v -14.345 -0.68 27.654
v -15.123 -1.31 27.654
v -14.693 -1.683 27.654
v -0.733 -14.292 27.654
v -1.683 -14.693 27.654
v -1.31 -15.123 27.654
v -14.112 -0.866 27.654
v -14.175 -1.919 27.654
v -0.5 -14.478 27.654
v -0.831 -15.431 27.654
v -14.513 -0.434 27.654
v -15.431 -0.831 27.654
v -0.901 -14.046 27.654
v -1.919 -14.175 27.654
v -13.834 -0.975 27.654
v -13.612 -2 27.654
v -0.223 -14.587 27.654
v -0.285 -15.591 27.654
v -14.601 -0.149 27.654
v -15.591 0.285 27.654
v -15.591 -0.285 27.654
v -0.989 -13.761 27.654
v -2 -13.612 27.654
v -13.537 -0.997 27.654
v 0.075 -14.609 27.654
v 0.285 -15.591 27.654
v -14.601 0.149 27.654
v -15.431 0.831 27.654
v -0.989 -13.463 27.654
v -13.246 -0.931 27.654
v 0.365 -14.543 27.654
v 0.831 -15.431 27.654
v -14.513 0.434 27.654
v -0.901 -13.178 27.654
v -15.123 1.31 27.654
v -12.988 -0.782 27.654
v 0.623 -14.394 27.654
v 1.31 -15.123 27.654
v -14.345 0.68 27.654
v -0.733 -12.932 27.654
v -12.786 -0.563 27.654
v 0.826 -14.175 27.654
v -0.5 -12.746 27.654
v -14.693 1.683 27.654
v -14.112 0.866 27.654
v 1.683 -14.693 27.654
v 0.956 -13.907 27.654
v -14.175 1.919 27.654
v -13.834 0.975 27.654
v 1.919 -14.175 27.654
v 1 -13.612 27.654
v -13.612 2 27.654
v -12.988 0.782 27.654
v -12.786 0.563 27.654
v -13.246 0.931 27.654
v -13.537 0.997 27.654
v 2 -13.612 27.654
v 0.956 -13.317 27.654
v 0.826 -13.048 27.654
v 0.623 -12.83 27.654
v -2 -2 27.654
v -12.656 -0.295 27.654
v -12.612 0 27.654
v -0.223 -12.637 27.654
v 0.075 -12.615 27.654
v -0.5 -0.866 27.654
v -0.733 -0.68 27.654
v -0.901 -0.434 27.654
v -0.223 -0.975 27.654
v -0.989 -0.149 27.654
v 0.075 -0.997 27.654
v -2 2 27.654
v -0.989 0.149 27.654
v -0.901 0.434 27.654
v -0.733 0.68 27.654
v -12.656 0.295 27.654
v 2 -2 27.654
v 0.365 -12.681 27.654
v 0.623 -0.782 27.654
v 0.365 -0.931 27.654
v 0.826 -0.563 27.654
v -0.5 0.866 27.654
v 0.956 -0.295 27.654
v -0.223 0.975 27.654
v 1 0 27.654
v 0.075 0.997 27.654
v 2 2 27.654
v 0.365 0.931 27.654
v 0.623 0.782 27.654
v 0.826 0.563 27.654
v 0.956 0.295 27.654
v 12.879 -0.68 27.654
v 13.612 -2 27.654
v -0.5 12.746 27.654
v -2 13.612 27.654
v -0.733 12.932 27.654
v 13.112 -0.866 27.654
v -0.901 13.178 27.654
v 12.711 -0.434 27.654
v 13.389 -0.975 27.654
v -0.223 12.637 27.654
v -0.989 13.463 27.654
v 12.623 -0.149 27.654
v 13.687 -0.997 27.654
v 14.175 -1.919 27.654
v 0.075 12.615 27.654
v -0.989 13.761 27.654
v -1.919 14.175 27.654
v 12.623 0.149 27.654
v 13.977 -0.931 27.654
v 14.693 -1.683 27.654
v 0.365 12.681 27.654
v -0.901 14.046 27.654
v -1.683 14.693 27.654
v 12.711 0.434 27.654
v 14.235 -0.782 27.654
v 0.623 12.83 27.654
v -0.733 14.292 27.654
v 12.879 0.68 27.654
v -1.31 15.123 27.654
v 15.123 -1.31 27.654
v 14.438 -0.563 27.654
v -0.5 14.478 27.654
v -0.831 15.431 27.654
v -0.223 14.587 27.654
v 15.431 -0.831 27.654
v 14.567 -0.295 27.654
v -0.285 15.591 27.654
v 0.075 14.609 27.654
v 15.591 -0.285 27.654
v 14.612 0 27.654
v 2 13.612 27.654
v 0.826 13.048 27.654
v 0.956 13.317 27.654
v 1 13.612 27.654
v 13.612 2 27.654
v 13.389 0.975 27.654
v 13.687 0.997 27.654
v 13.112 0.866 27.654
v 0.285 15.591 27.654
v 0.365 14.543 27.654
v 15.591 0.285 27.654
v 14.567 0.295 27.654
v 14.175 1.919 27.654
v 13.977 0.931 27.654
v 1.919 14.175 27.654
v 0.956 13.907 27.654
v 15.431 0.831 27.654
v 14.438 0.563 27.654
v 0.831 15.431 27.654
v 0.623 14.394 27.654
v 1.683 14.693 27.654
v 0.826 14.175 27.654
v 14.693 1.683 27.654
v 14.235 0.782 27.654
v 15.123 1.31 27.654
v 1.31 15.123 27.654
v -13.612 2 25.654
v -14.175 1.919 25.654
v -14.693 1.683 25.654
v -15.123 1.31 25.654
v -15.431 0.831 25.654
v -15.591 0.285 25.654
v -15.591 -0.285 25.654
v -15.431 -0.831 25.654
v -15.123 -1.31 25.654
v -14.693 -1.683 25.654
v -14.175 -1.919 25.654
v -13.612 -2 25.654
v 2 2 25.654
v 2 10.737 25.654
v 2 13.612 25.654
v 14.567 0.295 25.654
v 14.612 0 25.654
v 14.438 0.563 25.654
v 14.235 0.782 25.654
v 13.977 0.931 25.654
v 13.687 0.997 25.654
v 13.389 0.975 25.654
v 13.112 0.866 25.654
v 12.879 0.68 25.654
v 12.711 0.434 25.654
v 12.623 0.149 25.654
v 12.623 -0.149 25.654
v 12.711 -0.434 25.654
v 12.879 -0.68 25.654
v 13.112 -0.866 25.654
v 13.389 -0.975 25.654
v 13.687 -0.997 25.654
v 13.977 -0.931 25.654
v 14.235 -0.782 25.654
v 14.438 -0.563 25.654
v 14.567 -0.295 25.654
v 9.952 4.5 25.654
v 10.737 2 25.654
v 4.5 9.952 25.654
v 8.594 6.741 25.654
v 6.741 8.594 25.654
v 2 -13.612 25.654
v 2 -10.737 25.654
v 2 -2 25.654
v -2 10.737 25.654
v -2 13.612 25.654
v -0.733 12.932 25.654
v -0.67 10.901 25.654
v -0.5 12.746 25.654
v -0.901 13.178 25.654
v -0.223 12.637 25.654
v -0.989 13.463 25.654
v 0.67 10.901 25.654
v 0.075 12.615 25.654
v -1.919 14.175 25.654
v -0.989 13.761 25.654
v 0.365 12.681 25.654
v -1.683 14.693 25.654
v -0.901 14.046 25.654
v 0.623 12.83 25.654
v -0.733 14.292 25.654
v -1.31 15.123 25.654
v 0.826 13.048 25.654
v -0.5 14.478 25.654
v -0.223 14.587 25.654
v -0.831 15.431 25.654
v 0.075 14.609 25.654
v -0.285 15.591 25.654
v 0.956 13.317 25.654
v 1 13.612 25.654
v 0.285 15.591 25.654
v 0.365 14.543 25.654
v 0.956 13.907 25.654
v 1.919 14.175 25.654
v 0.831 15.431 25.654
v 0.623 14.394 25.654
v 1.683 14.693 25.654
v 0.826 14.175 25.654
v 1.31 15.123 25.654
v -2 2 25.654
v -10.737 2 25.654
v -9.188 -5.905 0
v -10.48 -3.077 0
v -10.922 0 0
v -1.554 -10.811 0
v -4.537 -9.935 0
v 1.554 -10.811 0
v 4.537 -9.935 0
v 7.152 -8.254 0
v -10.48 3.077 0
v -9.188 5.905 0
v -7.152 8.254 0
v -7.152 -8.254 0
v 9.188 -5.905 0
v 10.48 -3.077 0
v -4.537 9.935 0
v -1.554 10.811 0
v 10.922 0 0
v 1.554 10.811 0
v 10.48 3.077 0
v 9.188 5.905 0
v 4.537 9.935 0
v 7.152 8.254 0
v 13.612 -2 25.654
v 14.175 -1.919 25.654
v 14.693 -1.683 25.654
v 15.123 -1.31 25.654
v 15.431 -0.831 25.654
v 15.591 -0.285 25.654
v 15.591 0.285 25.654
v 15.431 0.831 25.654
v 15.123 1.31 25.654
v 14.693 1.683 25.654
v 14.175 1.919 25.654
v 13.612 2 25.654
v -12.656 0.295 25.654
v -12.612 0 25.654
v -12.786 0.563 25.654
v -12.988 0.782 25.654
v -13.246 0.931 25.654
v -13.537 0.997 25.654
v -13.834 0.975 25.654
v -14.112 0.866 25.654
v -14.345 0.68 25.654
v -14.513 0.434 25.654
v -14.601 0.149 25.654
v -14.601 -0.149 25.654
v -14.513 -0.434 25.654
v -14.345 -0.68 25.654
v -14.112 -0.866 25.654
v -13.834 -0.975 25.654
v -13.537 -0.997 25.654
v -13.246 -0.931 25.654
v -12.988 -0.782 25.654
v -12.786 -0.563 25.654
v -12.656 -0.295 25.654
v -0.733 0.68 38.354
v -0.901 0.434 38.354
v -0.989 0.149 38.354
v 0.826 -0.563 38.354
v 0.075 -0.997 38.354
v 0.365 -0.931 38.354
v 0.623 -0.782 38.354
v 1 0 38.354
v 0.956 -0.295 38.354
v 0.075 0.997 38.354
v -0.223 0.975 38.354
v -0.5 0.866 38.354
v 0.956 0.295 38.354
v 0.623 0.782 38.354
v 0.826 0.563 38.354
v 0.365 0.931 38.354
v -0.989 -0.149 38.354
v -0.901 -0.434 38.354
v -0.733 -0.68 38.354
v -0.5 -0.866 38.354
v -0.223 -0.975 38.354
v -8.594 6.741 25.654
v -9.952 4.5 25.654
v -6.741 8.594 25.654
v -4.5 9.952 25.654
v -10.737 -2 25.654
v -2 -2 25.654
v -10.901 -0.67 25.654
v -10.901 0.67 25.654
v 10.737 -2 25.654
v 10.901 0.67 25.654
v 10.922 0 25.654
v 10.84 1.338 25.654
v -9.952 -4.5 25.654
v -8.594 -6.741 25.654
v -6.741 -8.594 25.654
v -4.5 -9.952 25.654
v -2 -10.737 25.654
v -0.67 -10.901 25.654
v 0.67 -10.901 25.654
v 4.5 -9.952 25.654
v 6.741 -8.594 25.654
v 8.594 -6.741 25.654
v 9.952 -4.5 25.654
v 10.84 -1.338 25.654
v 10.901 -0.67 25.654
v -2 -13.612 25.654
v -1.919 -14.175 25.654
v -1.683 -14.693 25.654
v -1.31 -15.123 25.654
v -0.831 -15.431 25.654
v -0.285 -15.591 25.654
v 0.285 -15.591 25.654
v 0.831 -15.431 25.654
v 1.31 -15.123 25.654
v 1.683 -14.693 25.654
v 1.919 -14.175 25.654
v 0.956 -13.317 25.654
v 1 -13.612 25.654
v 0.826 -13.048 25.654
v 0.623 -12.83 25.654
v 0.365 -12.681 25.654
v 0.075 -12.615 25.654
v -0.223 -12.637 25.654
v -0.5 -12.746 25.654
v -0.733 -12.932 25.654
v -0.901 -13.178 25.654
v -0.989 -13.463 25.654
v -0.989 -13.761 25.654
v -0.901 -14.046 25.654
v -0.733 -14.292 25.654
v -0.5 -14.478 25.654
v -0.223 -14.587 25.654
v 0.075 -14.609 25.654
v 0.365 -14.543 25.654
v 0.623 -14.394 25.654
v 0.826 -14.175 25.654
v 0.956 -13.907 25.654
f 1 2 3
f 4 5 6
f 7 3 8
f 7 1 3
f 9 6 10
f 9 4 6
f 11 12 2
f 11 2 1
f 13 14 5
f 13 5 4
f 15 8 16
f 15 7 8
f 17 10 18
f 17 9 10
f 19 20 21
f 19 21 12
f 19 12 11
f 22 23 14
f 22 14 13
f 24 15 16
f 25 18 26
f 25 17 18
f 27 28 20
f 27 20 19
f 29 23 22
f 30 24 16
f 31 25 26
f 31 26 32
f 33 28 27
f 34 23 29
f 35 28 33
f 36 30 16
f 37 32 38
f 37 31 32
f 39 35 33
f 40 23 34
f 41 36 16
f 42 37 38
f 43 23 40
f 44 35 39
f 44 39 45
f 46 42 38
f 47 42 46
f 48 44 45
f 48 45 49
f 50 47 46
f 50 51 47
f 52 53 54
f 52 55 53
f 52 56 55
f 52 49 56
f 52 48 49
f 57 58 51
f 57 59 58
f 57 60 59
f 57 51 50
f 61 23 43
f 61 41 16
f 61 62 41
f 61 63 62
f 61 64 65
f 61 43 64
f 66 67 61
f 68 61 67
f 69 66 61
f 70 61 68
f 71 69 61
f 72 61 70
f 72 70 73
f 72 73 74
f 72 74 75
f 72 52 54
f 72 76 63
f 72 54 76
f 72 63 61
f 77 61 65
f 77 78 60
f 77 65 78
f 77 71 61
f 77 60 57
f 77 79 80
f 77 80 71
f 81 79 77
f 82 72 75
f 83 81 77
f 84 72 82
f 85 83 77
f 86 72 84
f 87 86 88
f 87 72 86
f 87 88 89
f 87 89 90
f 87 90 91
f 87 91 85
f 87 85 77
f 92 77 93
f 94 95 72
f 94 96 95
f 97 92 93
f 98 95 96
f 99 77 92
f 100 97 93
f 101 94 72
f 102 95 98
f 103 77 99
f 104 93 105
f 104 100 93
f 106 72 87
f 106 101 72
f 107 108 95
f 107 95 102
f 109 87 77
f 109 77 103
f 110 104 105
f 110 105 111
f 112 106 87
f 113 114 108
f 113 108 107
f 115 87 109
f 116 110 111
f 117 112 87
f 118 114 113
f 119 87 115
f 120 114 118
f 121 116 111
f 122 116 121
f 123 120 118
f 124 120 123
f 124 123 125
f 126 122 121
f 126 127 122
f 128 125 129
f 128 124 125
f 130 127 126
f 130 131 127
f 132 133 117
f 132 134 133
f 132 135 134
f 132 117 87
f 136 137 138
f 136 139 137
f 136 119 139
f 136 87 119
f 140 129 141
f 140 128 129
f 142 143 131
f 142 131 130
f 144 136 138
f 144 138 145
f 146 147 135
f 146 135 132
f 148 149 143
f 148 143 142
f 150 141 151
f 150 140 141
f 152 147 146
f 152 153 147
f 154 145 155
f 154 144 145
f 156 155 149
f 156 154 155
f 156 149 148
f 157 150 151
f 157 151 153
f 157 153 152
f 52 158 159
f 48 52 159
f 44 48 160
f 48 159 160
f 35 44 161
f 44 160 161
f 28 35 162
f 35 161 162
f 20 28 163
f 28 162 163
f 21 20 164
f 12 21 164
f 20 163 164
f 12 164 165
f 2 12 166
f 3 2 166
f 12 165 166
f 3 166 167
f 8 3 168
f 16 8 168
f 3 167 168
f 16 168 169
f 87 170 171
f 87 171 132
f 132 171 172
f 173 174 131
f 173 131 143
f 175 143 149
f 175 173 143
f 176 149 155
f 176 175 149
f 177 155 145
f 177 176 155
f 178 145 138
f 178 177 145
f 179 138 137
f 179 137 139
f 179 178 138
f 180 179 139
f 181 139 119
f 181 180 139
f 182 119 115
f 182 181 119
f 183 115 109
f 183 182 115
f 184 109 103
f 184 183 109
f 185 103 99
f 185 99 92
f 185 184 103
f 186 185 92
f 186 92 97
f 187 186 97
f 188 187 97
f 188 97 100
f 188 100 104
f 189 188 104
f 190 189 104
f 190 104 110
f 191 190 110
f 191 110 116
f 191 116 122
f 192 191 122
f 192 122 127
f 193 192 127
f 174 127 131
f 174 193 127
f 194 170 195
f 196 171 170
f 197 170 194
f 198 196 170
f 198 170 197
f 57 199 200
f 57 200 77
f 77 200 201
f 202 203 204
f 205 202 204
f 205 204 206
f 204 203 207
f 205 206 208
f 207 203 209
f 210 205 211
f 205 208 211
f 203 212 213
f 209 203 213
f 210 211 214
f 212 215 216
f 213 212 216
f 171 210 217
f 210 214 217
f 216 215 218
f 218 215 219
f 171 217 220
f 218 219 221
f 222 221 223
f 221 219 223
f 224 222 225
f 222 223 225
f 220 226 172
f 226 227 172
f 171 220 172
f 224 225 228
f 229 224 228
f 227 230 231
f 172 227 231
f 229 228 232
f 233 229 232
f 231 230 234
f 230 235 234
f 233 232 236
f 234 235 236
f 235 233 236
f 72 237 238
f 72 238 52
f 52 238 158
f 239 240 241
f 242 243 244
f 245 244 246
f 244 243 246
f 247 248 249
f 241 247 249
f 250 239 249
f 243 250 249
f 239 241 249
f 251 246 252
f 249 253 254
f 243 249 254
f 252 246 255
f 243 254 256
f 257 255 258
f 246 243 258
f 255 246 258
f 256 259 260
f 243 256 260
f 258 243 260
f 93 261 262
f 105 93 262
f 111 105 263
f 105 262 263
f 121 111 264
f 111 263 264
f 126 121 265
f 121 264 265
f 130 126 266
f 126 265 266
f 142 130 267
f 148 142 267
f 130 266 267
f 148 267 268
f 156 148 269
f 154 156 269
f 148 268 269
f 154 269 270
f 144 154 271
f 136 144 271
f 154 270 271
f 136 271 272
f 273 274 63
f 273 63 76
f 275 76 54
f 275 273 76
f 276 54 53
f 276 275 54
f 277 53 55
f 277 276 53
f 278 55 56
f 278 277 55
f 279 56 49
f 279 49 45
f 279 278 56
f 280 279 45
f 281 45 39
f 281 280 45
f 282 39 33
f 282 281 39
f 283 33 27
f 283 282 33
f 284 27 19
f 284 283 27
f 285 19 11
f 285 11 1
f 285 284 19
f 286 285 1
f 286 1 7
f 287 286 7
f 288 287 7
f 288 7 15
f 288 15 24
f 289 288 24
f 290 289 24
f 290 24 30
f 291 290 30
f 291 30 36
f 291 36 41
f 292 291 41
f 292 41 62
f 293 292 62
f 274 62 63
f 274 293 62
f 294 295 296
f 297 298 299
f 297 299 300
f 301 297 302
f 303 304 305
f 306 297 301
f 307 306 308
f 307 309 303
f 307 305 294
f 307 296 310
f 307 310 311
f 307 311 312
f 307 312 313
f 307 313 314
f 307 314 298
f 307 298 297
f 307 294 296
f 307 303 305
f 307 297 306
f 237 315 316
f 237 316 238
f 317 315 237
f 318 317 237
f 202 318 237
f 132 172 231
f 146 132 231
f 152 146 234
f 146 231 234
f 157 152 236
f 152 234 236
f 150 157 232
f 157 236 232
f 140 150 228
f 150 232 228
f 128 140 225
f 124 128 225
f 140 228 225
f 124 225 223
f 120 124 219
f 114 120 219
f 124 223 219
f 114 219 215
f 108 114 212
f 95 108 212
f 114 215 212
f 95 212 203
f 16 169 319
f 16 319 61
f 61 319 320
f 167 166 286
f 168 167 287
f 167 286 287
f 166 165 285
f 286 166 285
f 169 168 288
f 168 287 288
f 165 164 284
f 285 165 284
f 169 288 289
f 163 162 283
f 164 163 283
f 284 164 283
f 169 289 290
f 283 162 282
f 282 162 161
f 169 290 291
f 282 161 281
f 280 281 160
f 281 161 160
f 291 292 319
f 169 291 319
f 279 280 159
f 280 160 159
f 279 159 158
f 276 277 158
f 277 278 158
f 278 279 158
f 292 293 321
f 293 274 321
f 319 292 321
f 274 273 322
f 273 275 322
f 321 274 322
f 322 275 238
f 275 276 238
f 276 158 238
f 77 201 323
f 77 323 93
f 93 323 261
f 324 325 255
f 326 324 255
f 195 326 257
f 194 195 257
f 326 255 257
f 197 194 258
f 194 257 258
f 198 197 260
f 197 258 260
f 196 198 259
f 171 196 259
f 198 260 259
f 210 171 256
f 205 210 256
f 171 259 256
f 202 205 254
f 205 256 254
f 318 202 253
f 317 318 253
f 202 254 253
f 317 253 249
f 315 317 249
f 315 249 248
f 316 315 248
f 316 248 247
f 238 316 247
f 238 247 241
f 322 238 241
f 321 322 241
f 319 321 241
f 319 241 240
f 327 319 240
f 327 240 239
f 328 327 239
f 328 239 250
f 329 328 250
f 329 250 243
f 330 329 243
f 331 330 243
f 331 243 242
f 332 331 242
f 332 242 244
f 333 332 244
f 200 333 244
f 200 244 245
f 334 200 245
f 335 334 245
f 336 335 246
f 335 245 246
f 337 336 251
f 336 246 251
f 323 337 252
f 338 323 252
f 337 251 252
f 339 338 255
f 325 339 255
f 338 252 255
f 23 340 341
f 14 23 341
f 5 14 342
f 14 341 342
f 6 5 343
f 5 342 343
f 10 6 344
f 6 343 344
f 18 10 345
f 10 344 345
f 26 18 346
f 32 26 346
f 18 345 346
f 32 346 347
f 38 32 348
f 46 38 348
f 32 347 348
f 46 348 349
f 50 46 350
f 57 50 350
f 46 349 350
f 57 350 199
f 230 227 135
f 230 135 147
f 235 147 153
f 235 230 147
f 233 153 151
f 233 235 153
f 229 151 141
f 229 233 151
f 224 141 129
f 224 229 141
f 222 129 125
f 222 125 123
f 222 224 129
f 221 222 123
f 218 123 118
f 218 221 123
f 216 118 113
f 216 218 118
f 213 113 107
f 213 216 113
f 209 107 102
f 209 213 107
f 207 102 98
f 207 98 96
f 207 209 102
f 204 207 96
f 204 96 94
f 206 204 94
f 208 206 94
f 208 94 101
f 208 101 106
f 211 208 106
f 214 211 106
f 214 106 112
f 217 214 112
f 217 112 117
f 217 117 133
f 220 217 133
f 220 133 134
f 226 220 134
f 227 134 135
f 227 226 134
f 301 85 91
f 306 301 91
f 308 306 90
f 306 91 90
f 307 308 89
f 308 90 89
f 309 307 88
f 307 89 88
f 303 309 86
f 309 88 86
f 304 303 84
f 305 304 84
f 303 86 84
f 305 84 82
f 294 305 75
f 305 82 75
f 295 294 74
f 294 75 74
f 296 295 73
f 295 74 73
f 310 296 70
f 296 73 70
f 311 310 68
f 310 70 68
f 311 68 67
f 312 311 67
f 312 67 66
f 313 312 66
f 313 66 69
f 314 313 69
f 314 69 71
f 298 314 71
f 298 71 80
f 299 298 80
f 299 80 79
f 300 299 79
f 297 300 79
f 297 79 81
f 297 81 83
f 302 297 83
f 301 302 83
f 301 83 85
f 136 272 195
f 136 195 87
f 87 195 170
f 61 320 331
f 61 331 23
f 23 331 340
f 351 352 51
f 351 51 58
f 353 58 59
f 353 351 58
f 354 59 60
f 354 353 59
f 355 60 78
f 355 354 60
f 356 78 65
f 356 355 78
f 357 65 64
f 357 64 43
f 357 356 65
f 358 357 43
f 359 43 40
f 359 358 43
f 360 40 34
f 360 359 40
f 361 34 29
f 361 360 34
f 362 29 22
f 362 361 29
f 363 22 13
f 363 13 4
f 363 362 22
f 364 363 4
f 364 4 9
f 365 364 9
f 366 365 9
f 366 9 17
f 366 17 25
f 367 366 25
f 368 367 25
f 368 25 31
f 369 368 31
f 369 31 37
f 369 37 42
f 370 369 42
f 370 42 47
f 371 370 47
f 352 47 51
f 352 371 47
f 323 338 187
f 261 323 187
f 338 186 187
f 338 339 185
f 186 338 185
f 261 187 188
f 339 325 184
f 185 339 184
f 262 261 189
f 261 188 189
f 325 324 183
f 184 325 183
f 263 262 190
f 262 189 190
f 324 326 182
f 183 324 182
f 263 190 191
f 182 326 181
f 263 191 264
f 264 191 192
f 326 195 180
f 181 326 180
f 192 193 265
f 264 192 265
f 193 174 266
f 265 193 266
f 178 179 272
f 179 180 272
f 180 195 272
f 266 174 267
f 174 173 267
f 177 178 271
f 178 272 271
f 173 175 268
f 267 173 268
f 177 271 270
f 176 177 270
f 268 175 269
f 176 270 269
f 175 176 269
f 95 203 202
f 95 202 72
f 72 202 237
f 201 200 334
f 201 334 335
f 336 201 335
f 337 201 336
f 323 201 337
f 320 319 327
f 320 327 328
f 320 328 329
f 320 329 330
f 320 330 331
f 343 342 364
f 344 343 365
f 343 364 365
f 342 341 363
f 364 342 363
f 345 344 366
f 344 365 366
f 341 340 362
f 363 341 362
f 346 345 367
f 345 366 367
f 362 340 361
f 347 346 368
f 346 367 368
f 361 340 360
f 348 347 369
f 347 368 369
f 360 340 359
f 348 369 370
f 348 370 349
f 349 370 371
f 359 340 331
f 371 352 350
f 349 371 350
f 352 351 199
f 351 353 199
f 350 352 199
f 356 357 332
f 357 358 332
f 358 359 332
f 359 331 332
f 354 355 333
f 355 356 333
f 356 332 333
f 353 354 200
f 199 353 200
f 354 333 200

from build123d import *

# Parameters (mm, degrees)
SKETCH1_R           = 10.922
BOSS_EXTRUDE1_DEPTH = 25.654
SKETCH2_R           = 1.00000054
BOSS_EXTRUDE4_DEPTH = 2.00000108
SKETCH3_R           = 1.00000054
BOSS_EXTRUDE3_DEPTH = 12.7


with BuildPart() as part:
    # Sketch1 → Boss-Extrude1 (new body)
    with BuildSketch(Plane.XY):
        Circle(SKETCH1_R)
    extrude(amount=BOSS_EXTRUDE1_DEPTH)

    # Sketch2 → Boss-Extrude4 (add)
    # profile 1 of 7: a face of its own
    with BuildSketch(Plane.XY.offset(25.654)):
        with BuildLine():
            Line((-1.999996, 10.737322758), (-1.999996, 1.999996))
            Line((-1.999996, 1.999996), (1.999996, 1.999996))
            Line((1.999996, 1.999996), (1.999996, 10.737322758))
            ThreePointArc((1.999996, 10.737322758), (0, 10.922), (-1.999996, 10.737322758))
        make_face()
    # profile 2 of 7: a face of its own
    with BuildSketch(Plane.XY.offset(25.654)):
        with BuildLine():
            Line((-1.999996, 13.6118), (-1.999996, 10.737322758))
            ThreePointArc((-1.999996, 10.737322758), (0, 10.922), (1.999996, 10.737322758))
            Line((1.999996, 10.737322758), (1.999996, 13.6118))
            ThreePointArc((1.999996, 13.6118), (0, 15.611796), (-1.999996, 13.6118))
        make_face()
        with Locations((0, 13.6118)):
            Circle(SKETCH2_R, mode=Mode.SUBTRACT)
    # profile 3 of 7: a face of its own
    with BuildSketch(Plane.XY.offset(25.654)):
        with BuildLine():
            ThreePointArc((-10.737322758, 1.999996), (-10.922, 0), (-10.737322758, -1.999996))
            Line((-10.737322758, -1.999996), (-1.999996, -1.999996))
            Line((-1.999996, -1.999996), (-1.999996, -10.737322758))
            ThreePointArc((-1.999996, -10.737322758), (0, -10.922), (1.999996, -10.737322758))
            Line((1.999996, -10.737322758), (1.999996, -1.999996))
            Line((1.999996, -1.999996), (10.737322758, -1.999996))
            ThreePointArc((10.737322758, -1.999996), (10.875732692, -1.00425217), (10.922, 0))
            ThreePointArc((10.922, 0), (10.875732692, 1.00425217), (10.737322758, 1.999996))
            Line((10.737322758, 1.999996), (1.999996, 1.999996))
            Line((1.999996, 1.999996), (0, 0))
            Line((0, 0), (-1.999996, 1.999996))
            Line((-1.999996, 1.999996), (-10.737322758, 1.999996))
        make_face()
    # profile 4 of 7: a face of its own
    with BuildSketch(Plane.XY.offset(25.654)):
        with BuildLine():
            ThreePointArc((10.922, 0), (10.875732692, -1.00425217), (10.737322758, -1.999996))
            Line((10.737322758, -1.999996), (13.6118, -1.999996))
            ThreePointArc((13.6118, -1.999996), (15.611796, 0), (13.6118, 1.999996))
            Line((13.6118, 1.999996), (10.737322758, 1.999996))
            ThreePointArc((10.737322758, 1.999996), (10.875732692, 1.00425217), (10.922, 0))
        make_face()
        with Locations((13.6118, 0)):
            Circle(SKETCH2_R, mode=Mode.SUBTRACT)
    # profile 5 of 7: a face of its own
    with BuildSketch(Plane.XY.offset(25.654)):
        Polygon((1.999996, 1.999996), (-1.999996, 1.999996), (0, 0), align=None)
    # profile 6 of 7: a face of its own
    with BuildSketch(Plane.XY.offset(25.654)):
        with BuildLine():
            ThreePointArc((1.999996, -10.737322758), (0, -10.922), (-1.999996, -10.737322758))
            Line((-1.999996, -10.737322758), (-1.999996, -13.6118))
            ThreePointArc((-1.999996, -13.6118), (0, -15.611796), (1.999996, -13.6118))
            Line((1.999996, -13.6118), (1.999996, -10.737322758))
        make_face()
        with Locations((0, -13.6118)):
            Circle(SKETCH2_R, mode=Mode.SUBTRACT)
    # profile 7 of 7: a face of its own
    with BuildSketch(Plane.XY.offset(25.654)):
        with BuildLine():
            ThreePointArc((-13.6118, 1.999996), (-15.611796, 0), (-13.6118, -1.999996))
            Line((-13.6118, -1.999996), (-10.737322758, -1.999996))
            ThreePointArc((-10.737322758, -1.999996), (-10.922, 0), (-10.737322758, 1.999996))
            Line((-10.737322758, 1.999996), (-13.6118, 1.999996))
        make_face()
        with Locations((-13.6118, 0)):
            Circle(SKETCH2_R, mode=Mode.SUBTRACT)
    extrude(amount=BOSS_EXTRUDE4_DEPTH)

    # Sketch3 → Boss-Extrude3 (add)
    with BuildSketch(Plane.XY.offset(25.654)):
        Circle(SKETCH3_R)
    extrude(amount=BOSS_EXTRUDE3_DEPTH)


solid = part.part
